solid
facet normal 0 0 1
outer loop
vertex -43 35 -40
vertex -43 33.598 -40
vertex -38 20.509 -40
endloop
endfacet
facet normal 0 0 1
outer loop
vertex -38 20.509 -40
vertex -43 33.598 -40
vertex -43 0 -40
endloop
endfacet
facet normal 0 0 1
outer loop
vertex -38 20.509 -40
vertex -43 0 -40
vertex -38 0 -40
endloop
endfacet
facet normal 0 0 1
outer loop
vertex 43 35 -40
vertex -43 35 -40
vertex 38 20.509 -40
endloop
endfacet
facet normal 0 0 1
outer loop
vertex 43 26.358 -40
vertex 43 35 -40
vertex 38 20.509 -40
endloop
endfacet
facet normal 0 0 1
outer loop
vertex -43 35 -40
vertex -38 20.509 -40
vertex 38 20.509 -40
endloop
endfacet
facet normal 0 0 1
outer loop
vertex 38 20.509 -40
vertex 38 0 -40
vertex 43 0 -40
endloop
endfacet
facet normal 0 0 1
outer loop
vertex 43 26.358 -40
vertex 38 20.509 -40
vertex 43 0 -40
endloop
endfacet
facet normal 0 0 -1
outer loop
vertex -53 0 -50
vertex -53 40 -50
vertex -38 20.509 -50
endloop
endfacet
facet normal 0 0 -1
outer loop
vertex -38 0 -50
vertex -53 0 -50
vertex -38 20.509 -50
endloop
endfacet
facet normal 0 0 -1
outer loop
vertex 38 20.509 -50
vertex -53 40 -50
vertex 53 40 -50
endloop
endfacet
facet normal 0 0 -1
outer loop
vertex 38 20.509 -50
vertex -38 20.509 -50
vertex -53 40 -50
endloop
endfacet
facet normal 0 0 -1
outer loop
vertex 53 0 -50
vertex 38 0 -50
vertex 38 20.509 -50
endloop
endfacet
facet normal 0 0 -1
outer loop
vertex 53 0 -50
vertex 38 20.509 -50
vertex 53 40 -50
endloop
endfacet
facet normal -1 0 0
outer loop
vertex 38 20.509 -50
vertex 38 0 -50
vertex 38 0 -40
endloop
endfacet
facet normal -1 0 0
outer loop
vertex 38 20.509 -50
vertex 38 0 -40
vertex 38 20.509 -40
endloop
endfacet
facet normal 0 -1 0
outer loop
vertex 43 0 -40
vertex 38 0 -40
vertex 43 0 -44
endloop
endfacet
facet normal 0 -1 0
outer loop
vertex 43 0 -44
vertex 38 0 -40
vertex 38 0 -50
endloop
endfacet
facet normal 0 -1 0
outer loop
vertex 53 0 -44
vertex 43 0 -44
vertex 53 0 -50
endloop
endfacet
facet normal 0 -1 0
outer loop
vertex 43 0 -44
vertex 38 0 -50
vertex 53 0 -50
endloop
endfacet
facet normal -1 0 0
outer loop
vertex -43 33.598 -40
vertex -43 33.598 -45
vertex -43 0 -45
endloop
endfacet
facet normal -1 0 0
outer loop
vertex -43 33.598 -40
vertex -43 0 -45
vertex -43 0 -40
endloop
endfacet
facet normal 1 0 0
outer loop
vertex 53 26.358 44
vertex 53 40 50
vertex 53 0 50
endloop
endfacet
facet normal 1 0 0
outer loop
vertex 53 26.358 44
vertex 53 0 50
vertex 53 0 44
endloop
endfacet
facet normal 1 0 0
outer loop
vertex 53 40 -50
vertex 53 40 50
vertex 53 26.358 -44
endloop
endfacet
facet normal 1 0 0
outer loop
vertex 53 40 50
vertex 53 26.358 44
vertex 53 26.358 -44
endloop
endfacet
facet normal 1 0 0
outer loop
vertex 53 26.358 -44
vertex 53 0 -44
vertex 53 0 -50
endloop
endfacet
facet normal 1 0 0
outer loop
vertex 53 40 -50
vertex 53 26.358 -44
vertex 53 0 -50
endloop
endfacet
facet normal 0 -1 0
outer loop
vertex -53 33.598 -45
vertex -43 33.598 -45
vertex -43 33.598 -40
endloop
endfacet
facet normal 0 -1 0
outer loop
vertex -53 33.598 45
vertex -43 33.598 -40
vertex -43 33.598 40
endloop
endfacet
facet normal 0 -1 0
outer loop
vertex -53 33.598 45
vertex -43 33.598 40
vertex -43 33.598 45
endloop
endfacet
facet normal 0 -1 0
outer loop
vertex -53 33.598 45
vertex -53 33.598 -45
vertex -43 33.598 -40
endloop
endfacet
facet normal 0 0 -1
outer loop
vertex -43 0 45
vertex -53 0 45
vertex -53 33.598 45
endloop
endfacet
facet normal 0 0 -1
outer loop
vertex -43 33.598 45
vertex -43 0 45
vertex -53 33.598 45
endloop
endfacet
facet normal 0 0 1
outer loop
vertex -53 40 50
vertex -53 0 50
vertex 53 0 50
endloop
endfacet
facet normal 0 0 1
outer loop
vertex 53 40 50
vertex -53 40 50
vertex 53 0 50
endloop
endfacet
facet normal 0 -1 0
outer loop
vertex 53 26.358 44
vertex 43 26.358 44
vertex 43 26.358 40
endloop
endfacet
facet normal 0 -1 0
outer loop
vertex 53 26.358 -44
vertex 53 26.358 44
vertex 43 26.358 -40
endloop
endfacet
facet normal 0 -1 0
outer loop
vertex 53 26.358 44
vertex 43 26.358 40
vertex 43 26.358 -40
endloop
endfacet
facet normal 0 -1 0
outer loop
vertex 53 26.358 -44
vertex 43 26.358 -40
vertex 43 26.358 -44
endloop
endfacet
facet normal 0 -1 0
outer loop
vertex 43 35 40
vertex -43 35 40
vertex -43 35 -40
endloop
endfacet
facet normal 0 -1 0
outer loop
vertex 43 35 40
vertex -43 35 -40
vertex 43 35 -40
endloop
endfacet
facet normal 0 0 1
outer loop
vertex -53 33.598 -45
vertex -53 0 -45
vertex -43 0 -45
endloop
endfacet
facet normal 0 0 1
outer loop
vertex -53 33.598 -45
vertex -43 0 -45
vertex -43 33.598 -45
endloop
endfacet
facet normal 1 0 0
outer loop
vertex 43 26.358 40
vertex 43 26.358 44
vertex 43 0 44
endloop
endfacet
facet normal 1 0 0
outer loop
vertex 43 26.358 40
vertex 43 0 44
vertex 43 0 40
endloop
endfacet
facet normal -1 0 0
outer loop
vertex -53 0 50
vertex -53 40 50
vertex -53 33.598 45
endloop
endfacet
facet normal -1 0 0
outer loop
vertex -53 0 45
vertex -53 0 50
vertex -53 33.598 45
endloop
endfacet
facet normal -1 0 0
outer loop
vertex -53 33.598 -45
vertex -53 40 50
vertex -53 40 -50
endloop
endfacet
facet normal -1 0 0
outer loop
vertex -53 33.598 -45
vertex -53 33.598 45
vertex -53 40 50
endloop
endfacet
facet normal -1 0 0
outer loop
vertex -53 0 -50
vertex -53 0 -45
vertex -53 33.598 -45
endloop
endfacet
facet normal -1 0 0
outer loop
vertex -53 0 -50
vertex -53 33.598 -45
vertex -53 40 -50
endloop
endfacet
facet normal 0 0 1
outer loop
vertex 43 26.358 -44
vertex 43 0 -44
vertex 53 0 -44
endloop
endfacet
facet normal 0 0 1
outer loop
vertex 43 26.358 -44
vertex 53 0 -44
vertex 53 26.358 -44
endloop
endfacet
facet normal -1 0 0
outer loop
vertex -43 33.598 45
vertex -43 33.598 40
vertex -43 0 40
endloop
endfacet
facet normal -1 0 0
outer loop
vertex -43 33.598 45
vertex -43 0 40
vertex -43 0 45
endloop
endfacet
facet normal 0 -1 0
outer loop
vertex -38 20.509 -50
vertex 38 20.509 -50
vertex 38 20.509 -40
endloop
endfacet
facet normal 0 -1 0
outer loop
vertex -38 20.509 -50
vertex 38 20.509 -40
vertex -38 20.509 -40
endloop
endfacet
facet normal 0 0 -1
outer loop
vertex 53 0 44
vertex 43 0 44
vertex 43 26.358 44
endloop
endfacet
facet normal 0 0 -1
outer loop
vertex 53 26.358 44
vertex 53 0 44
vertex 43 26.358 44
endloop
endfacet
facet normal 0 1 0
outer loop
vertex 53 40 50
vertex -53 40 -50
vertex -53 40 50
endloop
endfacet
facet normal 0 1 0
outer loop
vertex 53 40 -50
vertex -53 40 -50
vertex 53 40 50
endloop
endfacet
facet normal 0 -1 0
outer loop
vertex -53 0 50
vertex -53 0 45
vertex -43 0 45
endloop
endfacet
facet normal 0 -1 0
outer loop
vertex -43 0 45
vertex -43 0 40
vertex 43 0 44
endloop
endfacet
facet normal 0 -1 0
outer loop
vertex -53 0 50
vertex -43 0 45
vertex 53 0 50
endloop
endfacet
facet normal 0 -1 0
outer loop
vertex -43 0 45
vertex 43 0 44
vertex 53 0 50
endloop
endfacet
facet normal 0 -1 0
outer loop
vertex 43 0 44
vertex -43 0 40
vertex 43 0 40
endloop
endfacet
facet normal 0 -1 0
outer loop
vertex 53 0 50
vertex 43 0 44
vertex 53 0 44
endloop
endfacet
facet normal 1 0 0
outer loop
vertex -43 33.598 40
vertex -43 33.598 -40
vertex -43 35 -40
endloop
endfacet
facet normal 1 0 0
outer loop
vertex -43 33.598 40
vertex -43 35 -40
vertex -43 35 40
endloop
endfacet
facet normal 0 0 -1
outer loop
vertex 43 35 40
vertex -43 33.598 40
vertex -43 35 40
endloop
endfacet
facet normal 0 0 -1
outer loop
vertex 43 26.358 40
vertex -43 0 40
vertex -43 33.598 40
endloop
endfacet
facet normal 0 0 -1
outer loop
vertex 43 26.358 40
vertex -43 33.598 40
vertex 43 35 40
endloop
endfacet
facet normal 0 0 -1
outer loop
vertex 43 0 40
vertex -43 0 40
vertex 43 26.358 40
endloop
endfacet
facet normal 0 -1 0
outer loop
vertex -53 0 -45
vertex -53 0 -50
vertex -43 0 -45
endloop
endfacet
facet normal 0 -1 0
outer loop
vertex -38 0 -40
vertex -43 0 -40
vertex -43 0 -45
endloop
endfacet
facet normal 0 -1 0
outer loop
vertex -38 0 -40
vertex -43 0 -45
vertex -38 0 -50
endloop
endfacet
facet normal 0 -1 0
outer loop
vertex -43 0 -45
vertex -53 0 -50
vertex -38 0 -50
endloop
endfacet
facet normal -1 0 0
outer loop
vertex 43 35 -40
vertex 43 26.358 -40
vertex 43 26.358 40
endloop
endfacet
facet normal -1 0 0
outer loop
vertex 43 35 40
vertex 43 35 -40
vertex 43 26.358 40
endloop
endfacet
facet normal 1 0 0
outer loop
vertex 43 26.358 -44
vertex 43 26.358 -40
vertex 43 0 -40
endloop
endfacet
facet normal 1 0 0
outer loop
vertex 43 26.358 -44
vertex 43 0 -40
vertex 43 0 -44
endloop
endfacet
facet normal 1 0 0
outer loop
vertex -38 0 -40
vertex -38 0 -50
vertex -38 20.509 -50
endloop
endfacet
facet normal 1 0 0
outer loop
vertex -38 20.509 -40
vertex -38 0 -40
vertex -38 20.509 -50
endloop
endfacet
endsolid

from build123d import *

# Parameters (mm, degrees)
SKETCH1_W               = 106
SKETCH1_H               = 100
BOSS_EXTRUDE1_DEPTH     = 40
SKETCH2_W               = 86
SKETCH2_H               = 80
CUT_EXTRUDE1_DEPTH      = 35
CUT_EXTRUDE2_DEPTH      = 124.838604643
CUT_EXTRUDE2_DEPTH_BACK = 10
SKETCH3_W               = 88
SKETCH3_H               = 26.357936409
SKETCH4_W               = 90
SKETCH4_H               = 33.597569481
CUT_EXTRUDE3_DEPTH      = 10
SKETCH5_W               = 76
SKETCH5_H               = 20.50870907
CUT_EXTRUDE4_DEPTH      = 10


with BuildPart() as part:
    # Sketch1 → Boss-Extrude1 (new body)
    with BuildSketch(Plane(origin=(0, 0, 0), x_dir=(1, 0, 0), z_dir=(0, 1, 0))):
        Rectangle(SKETCH1_W, SKETCH1_H)
    extrude(amount=BOSS_EXTRUDE1_DEPTH)

    # Sketch2 → Cut-Extrude1 (cut)
    with BuildSketch(Plane.XZ):
        Rectangle(SKETCH2_W, SKETCH2_H)
    extrude(amount=-CUT_EXTRUDE1_DEPTH, mode=Mode.SUBTRACT)

    # Sketch3 → Cut-Extrude2 (cut, two sides: drawn at the far end of the back side and taken through both)
    with BuildSketch(Plane(origin=(53, 0, 0), x_dir=(0, 0, -1), z_dir=(1, 0, 0)).offset(-CUT_EXTRUDE2_DEPTH_BACK)):
        with Locations((0, 13.178968205)):
            Rectangle(SKETCH3_W, SKETCH3_H)
    extrude(amount=CUT_EXTRUDE2_DEPTH + CUT_EXTRUDE2_DEPTH_BACK, mode=Mode.SUBTRACT)

    # Sketch4 → Cut-Extrude3 (cut)
    with BuildSketch(Plane.ZY.offset(53)):
        with Locations((0, 16.798784741)):
            Rectangle(SKETCH4_W, SKETCH4_H)
    extrude(amount=-CUT_EXTRUDE3_DEPTH, mode=Mode.SUBTRACT)

    # Sketch5 → Cut-Extrude4 (cut)
    with BuildSketch(Plane(origin=(0, 0, -50), x_dir=(-1, 0, 0), z_dir=(0, 0, -1))):
        with Locations((0, 10.254354535)):
            Rectangle(SKETCH5_W, SKETCH5_H)
    extrude(amount=-CUT_EXTRUDE4_DEPTH, mode=Mode.SUBTRACT)


solid = part.part
